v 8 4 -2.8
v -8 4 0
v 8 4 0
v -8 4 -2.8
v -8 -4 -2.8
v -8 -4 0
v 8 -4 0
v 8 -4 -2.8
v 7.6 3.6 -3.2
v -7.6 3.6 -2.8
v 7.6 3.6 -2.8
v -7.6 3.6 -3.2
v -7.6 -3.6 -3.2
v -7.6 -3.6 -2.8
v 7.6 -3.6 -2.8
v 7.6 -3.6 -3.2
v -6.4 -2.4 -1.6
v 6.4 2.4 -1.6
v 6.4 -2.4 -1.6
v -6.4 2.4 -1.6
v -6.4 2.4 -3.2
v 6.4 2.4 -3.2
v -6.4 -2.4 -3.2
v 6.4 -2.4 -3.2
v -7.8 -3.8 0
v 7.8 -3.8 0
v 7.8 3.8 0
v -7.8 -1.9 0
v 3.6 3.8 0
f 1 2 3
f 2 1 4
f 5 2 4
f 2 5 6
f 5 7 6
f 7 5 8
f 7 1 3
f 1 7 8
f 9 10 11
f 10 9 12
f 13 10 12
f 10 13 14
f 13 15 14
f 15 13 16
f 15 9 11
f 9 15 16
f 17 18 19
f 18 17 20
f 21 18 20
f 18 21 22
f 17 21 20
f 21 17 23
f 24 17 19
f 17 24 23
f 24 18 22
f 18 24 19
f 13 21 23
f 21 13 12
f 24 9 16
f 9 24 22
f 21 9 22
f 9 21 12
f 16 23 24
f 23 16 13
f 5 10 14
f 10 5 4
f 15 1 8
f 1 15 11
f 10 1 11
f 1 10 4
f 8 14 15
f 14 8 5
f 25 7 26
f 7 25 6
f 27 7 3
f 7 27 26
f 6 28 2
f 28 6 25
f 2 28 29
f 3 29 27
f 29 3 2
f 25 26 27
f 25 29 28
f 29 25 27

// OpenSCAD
// file: ../p/box5.scad
use <../lib.scad>
function ldraw_lib__box5() = [
// 0 Box with 5 Faces and All Edges
// 0 Name: box5.dat
// 0 Author: James Jessiman
// 0 !LDRAW_ORG Primitive UPDATE 2012-01
// 0 !LICENSE Licensed under CC BY 2.0 and CC BY 4.0 : see CAreadme.txt
// 
// 0 BFC CERTIFY CCW
  [0,"BFC","CERTIFY"],
  [0,"BFC","CCW"],
// 
// 0 !HISTORY 2002-04-03 [sbliss] Modified for BFC compliance
// 0 !HISTORY 2002-04-25 [PTadmin] Official Update 2002-02
// 0 !HISTORY 2007-06-24 [PTadmin] Header formatted for Contributor Agreement
// 0 !HISTORY 2008-07-01 [PTadmin] Official Update 2008-01
// 0 !HISTORY 2012-02-16 [Philo] Changed to CCW
// 0 !HISTORY 2012-03-30 [PTadmin] Official Update 2012-01
// 
// 
// 2 24 1 1 1 -1 1 1
  [2,24,1,1,1,-1,1,1],
// 2 24 -1 1 1 -1 1 -1
  [2,24,-1,1,1,-1,1,-1],
// 2 24 -1 1 -1 1 1 -1
  [2,24,-1,1,-1,1,1,-1],
// 2 24 1 1 -1 1 1 1
  [2,24,1,1,-1,1,1,1],
// 2 24 1 0 1 -1 0 1
  [2,24,1,0,1,-1,0,1],
// 2 24 -1 0 1 -1 0 -1
  [2,24,-1,0,1,-1,0,-1],
// 2 24 -1 0 -1 1 0 -1
  [2,24,-1,0,-1,1,0,-1],
// 2 24 1 0 -1 1 0 1
  [2,24,1,0,-1,1,0,1],
// 2 24 1 0 1 1 1 1
  [2,24,1,0,1,1,1,1],
// 2 24 -1 0 1 -1 1 1
  [2,24,-1,0,1,-1,1,1],
// 2 24 1 0 -1 1 1 -1
  [2,24,1,0,-1,1,1,-1],
// 2 24 -1 0 -1 -1 1 -1
  [2,24,-1,0,-1,-1,1,-1],
// 4 16 -1 1 1 1 1 1 1 1 -1 -1 1 -1
  [4,16,-1,1,1,1,1,1,1,1,-1,-1,1,-1],
// 4 16 -1 1 1 -1 0 1 1 0 1 1 1 1
  [4,16,-1,1,1,-1,0,1,1,0,1,1,1,1],
// 4 16 -1 1 -1 -1 0 -1 -1 0 1 -1 1 1
  [4,16,-1,1,-1,-1,0,-1,-1,0,1,-1,1,1],
// 4 16 1 1 -1 1 0 -1 -1 0 -1 -1 1 -1
  [4,16,1,1,-1,1,0,-1,-1,0,-1,-1,1,-1],
// 4 16 1 1 1 1 0 1 1 0 -1 1 1 -1
  [4,16,1,1,1,1,0,1,1,0,-1,1,1,-1],
];
module ldraw_lib__box5(step=0, col=false, unit=2/5, alt=false, line=0.2, solid=!$preview)
    makepoly(ldraw_lib__box5(), step=step, col=col, unit=unit, alt=alt, line=line, solid=solid);
ldraw_lib__box5(line=0.2);
// file: ../p/box4.scad
use <../lib.scad>
function ldraw_lib__box4() = [
// 0 Box with 4 Faces (2 Parallel Pairs) and All Edges
// 0 Name: box4.dat
// 0 Author: James Jessiman
// 0 !LDRAW_ORG Primitive UPDATE 2012-01
// 0 !LICENSE Licensed under CC BY 2.0 and CC BY 4.0 : see CAreadme.txt
// 
// 0 BFC CERTIFY CCW
  [0,"BFC","CERTIFY"],
  [0,"BFC","CCW"],
// 
// 0 !HISTORY 2002-04-03 [sbliss] Modified for BFC compliance
// 0 !HISTORY 2002-04-25 [PTadmin] Official Update 2002-02
// 0 !HISTORY 2007-06-24 [PTadmin] Header formatted for Contributor Agreement
// 0 !HISTORY 2008-07-01 [PTadmin] Official Update 2008-01
// 0 !HISTORY 2012-02-16 [Philo] Changed to CCW
// 0 !HISTORY 2012-03-30 [PTadmin] Official Update 2012-01
// 
// 
// 2 24 1 1 1 -1 1 1
  [2,24,1,1,1,-1,1,1],
// 2 24 -1 1 1 -1 1 -1
  [2,24,-1,1,1,-1,1,-1],
// 2 24 -1 1 -1 1 1 -1
  [2,24,-1,1,-1,1,1,-1],
// 2 24 1 1 -1 1 1 1
  [2,24,1,1,-1,1,1,1],
// 2 24 1 0 1 -1 0 1
  [2,24,1,0,1,-1,0,1],
// 2 24 -1 0 1 -1 0 -1
  [2,24,-1,0,1,-1,0,-1],
// 2 24 -1 0 -1 1 0 -1
  [2,24,-1,0,-1,1,0,-1],
// 2 24 1 0 -1 1 0 1
  [2,24,1,0,-1,1,0,1],
// 2 24 1 0 1 1 1 1
  [2,24,1,0,1,1,1,1],
// 2 24 -1 0 1 -1 1 1
  [2,24,-1,0,1,-1,1,1],
// 2 24 1 0 -1 1 1 -1
  [2,24,1,0,-1,1,1,-1],
// 2 24 -1 0 -1 -1 1 -1
  [2,24,-1,0,-1,-1,1,-1],
// 4 16 -1 1 1 -1 0 1 1 0 1 1 1 1
  [4,16,-1,1,1,-1,0,1,1,0,1,1,1,1],
// 4 16 -1 1 -1 -1 0 -1 -1 0 1 -1 1 1
  [4,16,-1,1,-1,-1,0,-1,-1,0,1,-1,1,1],
// 4 16 1 1 -1 1 0 -1 -1 0 -1 -1 1 -1
  [4,16,1,1,-1,1,0,-1,-1,0,-1,-1,1,-1],
// 4 16 1 1 1 1 0 1 1 0 -1 1 1 -1
  [4,16,1,1,1,1,0,1,1,0,-1,1,1,-1],
];
module ldraw_lib__box4(step=0, col=false, unit=2/5, alt=false, line=0.2, solid=!$preview)
    makepoly(ldraw_lib__box4(), step=step, col=col, unit=unit, alt=alt, line=line, solid=solid);
ldraw_lib__box4(line=0.2);
// file: s/3069bs01.scad
use <../../lib.scad>
use <../../p/box4.scad>
use <../../p/box5.scad>
function ldraw_lib__s__3069bs01() = [
// 0 ~Tile  1 x  2 with Groove without Top Face
// 0 Name: s\3069bs01.dat
// 0 Author: Santeri Piippo [arezey]
// 0 !LDRAW_ORG Subpart UPDATE 2010-02
// 0 !LICENSE Licensed under CC BY 2.0 and CC BY 4.0 : see CAreadme.txt
// 
// 0 BFC CERTIFY CCW
  [0,"BFC","CERTIFY"],
  [0,"BFC","CCW"],
// 
// 0 !HISTORY 2010-07-05 [PTadmin] Official Update 2010-02
// 
// 
// 1 16 0 0 0 20 0 0 0 7 0 0 0 10 box4.dat
  [1,16,0,0,0,20,0,0,0,7,0,0,0,10, ldraw_lib__box4()],
// 1 16 0 7 0 19 0 0 0 1 0 0 0 9 box4.dat
  [1,16,0,7,0,19,0,0,0,1,0,0,0,9, ldraw_lib__box4()],
// 0 BFC INVERTNEXT
  [0,"BFC","INVERTNEXT"],
// 1 16 0 8 0 16 0 0 0 -4 0 0 0 6 box5.dat
  [1,16,0,8,0,16,0,0,0,-4,0,0,0,6, ldraw_lib__box5()],
// 4 16 -19 8 9 -16 8 6 -16 8 -6 -19 8 -9
  [4,16,-19,8,9,-16,8,6,-16,8,-6,-19,8,-9],
// 4 16 19 8 -9 16 8 -6 16 8 6 19 8 9
  [4,16,19,8,-9,16,8,-6,16,8,6,19,8,9],
// 4 16 19 8 9 16 8 6 -16 8 6 -19 8 9
  [4,16,19,8,9,16,8,6,-16,8,6,-19,8,9],
// 4 16 -19 8 -9 -16 8 -6 16 8 -6 19 8 -9
  [4,16,-19,8,-9,-16,8,-6,16,8,-6,19,8,-9],
// 4 16 -20 7 10 -19 7 9 -19 7 -9 -20 7 -10
  [4,16,-20,7,10,-19,7,9,-19,7,-9,-20,7,-10],
// 4 16 20 7 -10 19 7 -9 19 7 9 20 7 10
  [4,16,20,7,-10,19,7,-9,19,7,9,20,7,10],
// 4 16 20 7 10 19 7 9 -19 7 9 -20 7 10
  [4,16,20,7,10,19,7,9,-19,7,9,-20,7,10],
// 4 16 -20 7 -10 -19 7 -9 19 7 -9 20 7 -10
  [4,16,-20,7,-10,-19,7,-9,19,7,-9,20,7,-10],
// 0 //
];
module ldraw_lib__s__3069bs01(step=0, col=false, unit=2/5, alt=false, line=0.2, solid=!$preview)
    makepoly(ldraw_lib__s__3069bs01(), step=step, col=col, unit=unit, alt=alt, line=line, solid=solid);
ldraw_lib__s__3069bs01(line=0.2);
// file: s/3069bphs01.scad
use <../../lib.scad>
function ldraw_lib__s__3069bphs01() = [
// 0 ~Tile  1 x  2 with Black Top without Lower-Left Corner Pattern - Top Surface
// 0 Name: s\3069bphs01.dat
// 0 Author: Massimo Maso [Sirio]
// 0 !LDRAW_ORG Subpart UPDATE 2017-01
// 0 !LICENSE Licensed under CC BY 2.0 and CC BY 4.0 : see CAreadme.txt
// 
// 0 BFC CERTIFY CW
  [0,"BFC","CERTIFY"],
  [0,"BFC","CW"],
// 
// 0 !HISTORY 2017-12-30 [PTadmin] Official Update 2017-01
// 
// 
// 0 // Uncolored surface
// 4 16 -19.5 0 9.5 -20 0 10 20 0 10 19.5 0 9.5
  [4,16,-19.5,0,9.5,-20,0,10,20,0,10,19.5,0,9.5],
// 4 16 19.5 0 -9.5 19.5 0 9.5 20 0 10 20 0 -10
  [4,16,19.5,0,-9.5,19.5,0,9.5,20,0,10,20,0,-10],
// 4 16 -20 0 -10 -20 0 10 -19.5 0 9.5 -19.5 0 4.75
  [4,16,-20,0,-10,-20,0,10,-19.5,0,9.5,-19.5,0,4.75],
// 3 16 -20 0 -10 -19.5 0 4.75 9 0 -9.5
  [3,16,-20,0,-10,-19.5,0,4.75,9,0,-9.5],
// 4 16 -20 0 -10 9 0 -9.5 19.5 0 -9.5 20 0 -10
  [4,16,-20,0,-10,9,0,-9.5,19.5,0,-9.5,20,0,-10],
// 0 // Black surface
// 3 0 -19.5 0 9.5 19.5 0 9.5 19.5 0 -9.5
  [3,0,-19.5,0,9.5,19.5,0,9.5,19.5,0,-9.5],
// 4 0 -19.5 0 9.5 19.5 0 -9.5 9 0 -9.5 -19.5 0 4.75
  [4,0,-19.5,0,9.5,19.5,0,-9.5,9,0,-9.5,-19.5,0,4.75],
];
module ldraw_lib__s__3069bphs01(step=0, col=false, unit=2/5, alt=false, line=0.2, solid=!$preview)
    makepoly(ldraw_lib__s__3069bphs01(), step=step, col=col, unit=unit, alt=alt, line=line, solid=solid);
ldraw_lib__s__3069bphs01(line=0.2);
// main file
use <../lib.scad>
use <s/3069bphs01.scad>
use <s/3069bs01.scad>
function ldraw_lib__3069bpi() = [
// 0 Tile  1 x  2 with Black Top without Upper-Left Corner Pattern
// 0 Name: 3069bpi.dat
// 0 Author: Massimo Maso [Sirio]
// 0 !LDRAW_ORG Part UPDATE 2017-01
// 0 !LICENSE Licensed under CC BY 2.0 and CC BY 4.0 : see CAreadme.txt
// 
// 0 BFC CERTIFY CCW
  [0,"BFC","CERTIFY"],
  [0,"BFC","CCW"],
// 
// 0 !HISTORY 2017-12-30 [PTadmin] Official Update 2017-01
// 
// 
// 1 16 0 0 0 1 0 0 0 1 0 0 0 1 s\3069bs01.dat
  [1,16,0,0,0,1,0,0,0,1,0,0,0,1, ldraw_lib__s__3069bs01()],
// 1 16 0 0 0 1 0 0 0 1 0 0 0 -1 s\3069bphs01.dat
  [1,16,0,0,0,1,0,0,0,1,0,0,0,-1, ldraw_lib__s__3069bphs01()],
];
module ldraw_lib__3069bpi(step=0, col=false, unit=2/5, alt=false, line=0.2, solid=!$preview)
    makepoly(ldraw_lib__3069bpi(), step=step, col=col, unit=unit, alt=alt, line=line, solid=solid);
ldraw_lib__3069bpi(line=0.2);
